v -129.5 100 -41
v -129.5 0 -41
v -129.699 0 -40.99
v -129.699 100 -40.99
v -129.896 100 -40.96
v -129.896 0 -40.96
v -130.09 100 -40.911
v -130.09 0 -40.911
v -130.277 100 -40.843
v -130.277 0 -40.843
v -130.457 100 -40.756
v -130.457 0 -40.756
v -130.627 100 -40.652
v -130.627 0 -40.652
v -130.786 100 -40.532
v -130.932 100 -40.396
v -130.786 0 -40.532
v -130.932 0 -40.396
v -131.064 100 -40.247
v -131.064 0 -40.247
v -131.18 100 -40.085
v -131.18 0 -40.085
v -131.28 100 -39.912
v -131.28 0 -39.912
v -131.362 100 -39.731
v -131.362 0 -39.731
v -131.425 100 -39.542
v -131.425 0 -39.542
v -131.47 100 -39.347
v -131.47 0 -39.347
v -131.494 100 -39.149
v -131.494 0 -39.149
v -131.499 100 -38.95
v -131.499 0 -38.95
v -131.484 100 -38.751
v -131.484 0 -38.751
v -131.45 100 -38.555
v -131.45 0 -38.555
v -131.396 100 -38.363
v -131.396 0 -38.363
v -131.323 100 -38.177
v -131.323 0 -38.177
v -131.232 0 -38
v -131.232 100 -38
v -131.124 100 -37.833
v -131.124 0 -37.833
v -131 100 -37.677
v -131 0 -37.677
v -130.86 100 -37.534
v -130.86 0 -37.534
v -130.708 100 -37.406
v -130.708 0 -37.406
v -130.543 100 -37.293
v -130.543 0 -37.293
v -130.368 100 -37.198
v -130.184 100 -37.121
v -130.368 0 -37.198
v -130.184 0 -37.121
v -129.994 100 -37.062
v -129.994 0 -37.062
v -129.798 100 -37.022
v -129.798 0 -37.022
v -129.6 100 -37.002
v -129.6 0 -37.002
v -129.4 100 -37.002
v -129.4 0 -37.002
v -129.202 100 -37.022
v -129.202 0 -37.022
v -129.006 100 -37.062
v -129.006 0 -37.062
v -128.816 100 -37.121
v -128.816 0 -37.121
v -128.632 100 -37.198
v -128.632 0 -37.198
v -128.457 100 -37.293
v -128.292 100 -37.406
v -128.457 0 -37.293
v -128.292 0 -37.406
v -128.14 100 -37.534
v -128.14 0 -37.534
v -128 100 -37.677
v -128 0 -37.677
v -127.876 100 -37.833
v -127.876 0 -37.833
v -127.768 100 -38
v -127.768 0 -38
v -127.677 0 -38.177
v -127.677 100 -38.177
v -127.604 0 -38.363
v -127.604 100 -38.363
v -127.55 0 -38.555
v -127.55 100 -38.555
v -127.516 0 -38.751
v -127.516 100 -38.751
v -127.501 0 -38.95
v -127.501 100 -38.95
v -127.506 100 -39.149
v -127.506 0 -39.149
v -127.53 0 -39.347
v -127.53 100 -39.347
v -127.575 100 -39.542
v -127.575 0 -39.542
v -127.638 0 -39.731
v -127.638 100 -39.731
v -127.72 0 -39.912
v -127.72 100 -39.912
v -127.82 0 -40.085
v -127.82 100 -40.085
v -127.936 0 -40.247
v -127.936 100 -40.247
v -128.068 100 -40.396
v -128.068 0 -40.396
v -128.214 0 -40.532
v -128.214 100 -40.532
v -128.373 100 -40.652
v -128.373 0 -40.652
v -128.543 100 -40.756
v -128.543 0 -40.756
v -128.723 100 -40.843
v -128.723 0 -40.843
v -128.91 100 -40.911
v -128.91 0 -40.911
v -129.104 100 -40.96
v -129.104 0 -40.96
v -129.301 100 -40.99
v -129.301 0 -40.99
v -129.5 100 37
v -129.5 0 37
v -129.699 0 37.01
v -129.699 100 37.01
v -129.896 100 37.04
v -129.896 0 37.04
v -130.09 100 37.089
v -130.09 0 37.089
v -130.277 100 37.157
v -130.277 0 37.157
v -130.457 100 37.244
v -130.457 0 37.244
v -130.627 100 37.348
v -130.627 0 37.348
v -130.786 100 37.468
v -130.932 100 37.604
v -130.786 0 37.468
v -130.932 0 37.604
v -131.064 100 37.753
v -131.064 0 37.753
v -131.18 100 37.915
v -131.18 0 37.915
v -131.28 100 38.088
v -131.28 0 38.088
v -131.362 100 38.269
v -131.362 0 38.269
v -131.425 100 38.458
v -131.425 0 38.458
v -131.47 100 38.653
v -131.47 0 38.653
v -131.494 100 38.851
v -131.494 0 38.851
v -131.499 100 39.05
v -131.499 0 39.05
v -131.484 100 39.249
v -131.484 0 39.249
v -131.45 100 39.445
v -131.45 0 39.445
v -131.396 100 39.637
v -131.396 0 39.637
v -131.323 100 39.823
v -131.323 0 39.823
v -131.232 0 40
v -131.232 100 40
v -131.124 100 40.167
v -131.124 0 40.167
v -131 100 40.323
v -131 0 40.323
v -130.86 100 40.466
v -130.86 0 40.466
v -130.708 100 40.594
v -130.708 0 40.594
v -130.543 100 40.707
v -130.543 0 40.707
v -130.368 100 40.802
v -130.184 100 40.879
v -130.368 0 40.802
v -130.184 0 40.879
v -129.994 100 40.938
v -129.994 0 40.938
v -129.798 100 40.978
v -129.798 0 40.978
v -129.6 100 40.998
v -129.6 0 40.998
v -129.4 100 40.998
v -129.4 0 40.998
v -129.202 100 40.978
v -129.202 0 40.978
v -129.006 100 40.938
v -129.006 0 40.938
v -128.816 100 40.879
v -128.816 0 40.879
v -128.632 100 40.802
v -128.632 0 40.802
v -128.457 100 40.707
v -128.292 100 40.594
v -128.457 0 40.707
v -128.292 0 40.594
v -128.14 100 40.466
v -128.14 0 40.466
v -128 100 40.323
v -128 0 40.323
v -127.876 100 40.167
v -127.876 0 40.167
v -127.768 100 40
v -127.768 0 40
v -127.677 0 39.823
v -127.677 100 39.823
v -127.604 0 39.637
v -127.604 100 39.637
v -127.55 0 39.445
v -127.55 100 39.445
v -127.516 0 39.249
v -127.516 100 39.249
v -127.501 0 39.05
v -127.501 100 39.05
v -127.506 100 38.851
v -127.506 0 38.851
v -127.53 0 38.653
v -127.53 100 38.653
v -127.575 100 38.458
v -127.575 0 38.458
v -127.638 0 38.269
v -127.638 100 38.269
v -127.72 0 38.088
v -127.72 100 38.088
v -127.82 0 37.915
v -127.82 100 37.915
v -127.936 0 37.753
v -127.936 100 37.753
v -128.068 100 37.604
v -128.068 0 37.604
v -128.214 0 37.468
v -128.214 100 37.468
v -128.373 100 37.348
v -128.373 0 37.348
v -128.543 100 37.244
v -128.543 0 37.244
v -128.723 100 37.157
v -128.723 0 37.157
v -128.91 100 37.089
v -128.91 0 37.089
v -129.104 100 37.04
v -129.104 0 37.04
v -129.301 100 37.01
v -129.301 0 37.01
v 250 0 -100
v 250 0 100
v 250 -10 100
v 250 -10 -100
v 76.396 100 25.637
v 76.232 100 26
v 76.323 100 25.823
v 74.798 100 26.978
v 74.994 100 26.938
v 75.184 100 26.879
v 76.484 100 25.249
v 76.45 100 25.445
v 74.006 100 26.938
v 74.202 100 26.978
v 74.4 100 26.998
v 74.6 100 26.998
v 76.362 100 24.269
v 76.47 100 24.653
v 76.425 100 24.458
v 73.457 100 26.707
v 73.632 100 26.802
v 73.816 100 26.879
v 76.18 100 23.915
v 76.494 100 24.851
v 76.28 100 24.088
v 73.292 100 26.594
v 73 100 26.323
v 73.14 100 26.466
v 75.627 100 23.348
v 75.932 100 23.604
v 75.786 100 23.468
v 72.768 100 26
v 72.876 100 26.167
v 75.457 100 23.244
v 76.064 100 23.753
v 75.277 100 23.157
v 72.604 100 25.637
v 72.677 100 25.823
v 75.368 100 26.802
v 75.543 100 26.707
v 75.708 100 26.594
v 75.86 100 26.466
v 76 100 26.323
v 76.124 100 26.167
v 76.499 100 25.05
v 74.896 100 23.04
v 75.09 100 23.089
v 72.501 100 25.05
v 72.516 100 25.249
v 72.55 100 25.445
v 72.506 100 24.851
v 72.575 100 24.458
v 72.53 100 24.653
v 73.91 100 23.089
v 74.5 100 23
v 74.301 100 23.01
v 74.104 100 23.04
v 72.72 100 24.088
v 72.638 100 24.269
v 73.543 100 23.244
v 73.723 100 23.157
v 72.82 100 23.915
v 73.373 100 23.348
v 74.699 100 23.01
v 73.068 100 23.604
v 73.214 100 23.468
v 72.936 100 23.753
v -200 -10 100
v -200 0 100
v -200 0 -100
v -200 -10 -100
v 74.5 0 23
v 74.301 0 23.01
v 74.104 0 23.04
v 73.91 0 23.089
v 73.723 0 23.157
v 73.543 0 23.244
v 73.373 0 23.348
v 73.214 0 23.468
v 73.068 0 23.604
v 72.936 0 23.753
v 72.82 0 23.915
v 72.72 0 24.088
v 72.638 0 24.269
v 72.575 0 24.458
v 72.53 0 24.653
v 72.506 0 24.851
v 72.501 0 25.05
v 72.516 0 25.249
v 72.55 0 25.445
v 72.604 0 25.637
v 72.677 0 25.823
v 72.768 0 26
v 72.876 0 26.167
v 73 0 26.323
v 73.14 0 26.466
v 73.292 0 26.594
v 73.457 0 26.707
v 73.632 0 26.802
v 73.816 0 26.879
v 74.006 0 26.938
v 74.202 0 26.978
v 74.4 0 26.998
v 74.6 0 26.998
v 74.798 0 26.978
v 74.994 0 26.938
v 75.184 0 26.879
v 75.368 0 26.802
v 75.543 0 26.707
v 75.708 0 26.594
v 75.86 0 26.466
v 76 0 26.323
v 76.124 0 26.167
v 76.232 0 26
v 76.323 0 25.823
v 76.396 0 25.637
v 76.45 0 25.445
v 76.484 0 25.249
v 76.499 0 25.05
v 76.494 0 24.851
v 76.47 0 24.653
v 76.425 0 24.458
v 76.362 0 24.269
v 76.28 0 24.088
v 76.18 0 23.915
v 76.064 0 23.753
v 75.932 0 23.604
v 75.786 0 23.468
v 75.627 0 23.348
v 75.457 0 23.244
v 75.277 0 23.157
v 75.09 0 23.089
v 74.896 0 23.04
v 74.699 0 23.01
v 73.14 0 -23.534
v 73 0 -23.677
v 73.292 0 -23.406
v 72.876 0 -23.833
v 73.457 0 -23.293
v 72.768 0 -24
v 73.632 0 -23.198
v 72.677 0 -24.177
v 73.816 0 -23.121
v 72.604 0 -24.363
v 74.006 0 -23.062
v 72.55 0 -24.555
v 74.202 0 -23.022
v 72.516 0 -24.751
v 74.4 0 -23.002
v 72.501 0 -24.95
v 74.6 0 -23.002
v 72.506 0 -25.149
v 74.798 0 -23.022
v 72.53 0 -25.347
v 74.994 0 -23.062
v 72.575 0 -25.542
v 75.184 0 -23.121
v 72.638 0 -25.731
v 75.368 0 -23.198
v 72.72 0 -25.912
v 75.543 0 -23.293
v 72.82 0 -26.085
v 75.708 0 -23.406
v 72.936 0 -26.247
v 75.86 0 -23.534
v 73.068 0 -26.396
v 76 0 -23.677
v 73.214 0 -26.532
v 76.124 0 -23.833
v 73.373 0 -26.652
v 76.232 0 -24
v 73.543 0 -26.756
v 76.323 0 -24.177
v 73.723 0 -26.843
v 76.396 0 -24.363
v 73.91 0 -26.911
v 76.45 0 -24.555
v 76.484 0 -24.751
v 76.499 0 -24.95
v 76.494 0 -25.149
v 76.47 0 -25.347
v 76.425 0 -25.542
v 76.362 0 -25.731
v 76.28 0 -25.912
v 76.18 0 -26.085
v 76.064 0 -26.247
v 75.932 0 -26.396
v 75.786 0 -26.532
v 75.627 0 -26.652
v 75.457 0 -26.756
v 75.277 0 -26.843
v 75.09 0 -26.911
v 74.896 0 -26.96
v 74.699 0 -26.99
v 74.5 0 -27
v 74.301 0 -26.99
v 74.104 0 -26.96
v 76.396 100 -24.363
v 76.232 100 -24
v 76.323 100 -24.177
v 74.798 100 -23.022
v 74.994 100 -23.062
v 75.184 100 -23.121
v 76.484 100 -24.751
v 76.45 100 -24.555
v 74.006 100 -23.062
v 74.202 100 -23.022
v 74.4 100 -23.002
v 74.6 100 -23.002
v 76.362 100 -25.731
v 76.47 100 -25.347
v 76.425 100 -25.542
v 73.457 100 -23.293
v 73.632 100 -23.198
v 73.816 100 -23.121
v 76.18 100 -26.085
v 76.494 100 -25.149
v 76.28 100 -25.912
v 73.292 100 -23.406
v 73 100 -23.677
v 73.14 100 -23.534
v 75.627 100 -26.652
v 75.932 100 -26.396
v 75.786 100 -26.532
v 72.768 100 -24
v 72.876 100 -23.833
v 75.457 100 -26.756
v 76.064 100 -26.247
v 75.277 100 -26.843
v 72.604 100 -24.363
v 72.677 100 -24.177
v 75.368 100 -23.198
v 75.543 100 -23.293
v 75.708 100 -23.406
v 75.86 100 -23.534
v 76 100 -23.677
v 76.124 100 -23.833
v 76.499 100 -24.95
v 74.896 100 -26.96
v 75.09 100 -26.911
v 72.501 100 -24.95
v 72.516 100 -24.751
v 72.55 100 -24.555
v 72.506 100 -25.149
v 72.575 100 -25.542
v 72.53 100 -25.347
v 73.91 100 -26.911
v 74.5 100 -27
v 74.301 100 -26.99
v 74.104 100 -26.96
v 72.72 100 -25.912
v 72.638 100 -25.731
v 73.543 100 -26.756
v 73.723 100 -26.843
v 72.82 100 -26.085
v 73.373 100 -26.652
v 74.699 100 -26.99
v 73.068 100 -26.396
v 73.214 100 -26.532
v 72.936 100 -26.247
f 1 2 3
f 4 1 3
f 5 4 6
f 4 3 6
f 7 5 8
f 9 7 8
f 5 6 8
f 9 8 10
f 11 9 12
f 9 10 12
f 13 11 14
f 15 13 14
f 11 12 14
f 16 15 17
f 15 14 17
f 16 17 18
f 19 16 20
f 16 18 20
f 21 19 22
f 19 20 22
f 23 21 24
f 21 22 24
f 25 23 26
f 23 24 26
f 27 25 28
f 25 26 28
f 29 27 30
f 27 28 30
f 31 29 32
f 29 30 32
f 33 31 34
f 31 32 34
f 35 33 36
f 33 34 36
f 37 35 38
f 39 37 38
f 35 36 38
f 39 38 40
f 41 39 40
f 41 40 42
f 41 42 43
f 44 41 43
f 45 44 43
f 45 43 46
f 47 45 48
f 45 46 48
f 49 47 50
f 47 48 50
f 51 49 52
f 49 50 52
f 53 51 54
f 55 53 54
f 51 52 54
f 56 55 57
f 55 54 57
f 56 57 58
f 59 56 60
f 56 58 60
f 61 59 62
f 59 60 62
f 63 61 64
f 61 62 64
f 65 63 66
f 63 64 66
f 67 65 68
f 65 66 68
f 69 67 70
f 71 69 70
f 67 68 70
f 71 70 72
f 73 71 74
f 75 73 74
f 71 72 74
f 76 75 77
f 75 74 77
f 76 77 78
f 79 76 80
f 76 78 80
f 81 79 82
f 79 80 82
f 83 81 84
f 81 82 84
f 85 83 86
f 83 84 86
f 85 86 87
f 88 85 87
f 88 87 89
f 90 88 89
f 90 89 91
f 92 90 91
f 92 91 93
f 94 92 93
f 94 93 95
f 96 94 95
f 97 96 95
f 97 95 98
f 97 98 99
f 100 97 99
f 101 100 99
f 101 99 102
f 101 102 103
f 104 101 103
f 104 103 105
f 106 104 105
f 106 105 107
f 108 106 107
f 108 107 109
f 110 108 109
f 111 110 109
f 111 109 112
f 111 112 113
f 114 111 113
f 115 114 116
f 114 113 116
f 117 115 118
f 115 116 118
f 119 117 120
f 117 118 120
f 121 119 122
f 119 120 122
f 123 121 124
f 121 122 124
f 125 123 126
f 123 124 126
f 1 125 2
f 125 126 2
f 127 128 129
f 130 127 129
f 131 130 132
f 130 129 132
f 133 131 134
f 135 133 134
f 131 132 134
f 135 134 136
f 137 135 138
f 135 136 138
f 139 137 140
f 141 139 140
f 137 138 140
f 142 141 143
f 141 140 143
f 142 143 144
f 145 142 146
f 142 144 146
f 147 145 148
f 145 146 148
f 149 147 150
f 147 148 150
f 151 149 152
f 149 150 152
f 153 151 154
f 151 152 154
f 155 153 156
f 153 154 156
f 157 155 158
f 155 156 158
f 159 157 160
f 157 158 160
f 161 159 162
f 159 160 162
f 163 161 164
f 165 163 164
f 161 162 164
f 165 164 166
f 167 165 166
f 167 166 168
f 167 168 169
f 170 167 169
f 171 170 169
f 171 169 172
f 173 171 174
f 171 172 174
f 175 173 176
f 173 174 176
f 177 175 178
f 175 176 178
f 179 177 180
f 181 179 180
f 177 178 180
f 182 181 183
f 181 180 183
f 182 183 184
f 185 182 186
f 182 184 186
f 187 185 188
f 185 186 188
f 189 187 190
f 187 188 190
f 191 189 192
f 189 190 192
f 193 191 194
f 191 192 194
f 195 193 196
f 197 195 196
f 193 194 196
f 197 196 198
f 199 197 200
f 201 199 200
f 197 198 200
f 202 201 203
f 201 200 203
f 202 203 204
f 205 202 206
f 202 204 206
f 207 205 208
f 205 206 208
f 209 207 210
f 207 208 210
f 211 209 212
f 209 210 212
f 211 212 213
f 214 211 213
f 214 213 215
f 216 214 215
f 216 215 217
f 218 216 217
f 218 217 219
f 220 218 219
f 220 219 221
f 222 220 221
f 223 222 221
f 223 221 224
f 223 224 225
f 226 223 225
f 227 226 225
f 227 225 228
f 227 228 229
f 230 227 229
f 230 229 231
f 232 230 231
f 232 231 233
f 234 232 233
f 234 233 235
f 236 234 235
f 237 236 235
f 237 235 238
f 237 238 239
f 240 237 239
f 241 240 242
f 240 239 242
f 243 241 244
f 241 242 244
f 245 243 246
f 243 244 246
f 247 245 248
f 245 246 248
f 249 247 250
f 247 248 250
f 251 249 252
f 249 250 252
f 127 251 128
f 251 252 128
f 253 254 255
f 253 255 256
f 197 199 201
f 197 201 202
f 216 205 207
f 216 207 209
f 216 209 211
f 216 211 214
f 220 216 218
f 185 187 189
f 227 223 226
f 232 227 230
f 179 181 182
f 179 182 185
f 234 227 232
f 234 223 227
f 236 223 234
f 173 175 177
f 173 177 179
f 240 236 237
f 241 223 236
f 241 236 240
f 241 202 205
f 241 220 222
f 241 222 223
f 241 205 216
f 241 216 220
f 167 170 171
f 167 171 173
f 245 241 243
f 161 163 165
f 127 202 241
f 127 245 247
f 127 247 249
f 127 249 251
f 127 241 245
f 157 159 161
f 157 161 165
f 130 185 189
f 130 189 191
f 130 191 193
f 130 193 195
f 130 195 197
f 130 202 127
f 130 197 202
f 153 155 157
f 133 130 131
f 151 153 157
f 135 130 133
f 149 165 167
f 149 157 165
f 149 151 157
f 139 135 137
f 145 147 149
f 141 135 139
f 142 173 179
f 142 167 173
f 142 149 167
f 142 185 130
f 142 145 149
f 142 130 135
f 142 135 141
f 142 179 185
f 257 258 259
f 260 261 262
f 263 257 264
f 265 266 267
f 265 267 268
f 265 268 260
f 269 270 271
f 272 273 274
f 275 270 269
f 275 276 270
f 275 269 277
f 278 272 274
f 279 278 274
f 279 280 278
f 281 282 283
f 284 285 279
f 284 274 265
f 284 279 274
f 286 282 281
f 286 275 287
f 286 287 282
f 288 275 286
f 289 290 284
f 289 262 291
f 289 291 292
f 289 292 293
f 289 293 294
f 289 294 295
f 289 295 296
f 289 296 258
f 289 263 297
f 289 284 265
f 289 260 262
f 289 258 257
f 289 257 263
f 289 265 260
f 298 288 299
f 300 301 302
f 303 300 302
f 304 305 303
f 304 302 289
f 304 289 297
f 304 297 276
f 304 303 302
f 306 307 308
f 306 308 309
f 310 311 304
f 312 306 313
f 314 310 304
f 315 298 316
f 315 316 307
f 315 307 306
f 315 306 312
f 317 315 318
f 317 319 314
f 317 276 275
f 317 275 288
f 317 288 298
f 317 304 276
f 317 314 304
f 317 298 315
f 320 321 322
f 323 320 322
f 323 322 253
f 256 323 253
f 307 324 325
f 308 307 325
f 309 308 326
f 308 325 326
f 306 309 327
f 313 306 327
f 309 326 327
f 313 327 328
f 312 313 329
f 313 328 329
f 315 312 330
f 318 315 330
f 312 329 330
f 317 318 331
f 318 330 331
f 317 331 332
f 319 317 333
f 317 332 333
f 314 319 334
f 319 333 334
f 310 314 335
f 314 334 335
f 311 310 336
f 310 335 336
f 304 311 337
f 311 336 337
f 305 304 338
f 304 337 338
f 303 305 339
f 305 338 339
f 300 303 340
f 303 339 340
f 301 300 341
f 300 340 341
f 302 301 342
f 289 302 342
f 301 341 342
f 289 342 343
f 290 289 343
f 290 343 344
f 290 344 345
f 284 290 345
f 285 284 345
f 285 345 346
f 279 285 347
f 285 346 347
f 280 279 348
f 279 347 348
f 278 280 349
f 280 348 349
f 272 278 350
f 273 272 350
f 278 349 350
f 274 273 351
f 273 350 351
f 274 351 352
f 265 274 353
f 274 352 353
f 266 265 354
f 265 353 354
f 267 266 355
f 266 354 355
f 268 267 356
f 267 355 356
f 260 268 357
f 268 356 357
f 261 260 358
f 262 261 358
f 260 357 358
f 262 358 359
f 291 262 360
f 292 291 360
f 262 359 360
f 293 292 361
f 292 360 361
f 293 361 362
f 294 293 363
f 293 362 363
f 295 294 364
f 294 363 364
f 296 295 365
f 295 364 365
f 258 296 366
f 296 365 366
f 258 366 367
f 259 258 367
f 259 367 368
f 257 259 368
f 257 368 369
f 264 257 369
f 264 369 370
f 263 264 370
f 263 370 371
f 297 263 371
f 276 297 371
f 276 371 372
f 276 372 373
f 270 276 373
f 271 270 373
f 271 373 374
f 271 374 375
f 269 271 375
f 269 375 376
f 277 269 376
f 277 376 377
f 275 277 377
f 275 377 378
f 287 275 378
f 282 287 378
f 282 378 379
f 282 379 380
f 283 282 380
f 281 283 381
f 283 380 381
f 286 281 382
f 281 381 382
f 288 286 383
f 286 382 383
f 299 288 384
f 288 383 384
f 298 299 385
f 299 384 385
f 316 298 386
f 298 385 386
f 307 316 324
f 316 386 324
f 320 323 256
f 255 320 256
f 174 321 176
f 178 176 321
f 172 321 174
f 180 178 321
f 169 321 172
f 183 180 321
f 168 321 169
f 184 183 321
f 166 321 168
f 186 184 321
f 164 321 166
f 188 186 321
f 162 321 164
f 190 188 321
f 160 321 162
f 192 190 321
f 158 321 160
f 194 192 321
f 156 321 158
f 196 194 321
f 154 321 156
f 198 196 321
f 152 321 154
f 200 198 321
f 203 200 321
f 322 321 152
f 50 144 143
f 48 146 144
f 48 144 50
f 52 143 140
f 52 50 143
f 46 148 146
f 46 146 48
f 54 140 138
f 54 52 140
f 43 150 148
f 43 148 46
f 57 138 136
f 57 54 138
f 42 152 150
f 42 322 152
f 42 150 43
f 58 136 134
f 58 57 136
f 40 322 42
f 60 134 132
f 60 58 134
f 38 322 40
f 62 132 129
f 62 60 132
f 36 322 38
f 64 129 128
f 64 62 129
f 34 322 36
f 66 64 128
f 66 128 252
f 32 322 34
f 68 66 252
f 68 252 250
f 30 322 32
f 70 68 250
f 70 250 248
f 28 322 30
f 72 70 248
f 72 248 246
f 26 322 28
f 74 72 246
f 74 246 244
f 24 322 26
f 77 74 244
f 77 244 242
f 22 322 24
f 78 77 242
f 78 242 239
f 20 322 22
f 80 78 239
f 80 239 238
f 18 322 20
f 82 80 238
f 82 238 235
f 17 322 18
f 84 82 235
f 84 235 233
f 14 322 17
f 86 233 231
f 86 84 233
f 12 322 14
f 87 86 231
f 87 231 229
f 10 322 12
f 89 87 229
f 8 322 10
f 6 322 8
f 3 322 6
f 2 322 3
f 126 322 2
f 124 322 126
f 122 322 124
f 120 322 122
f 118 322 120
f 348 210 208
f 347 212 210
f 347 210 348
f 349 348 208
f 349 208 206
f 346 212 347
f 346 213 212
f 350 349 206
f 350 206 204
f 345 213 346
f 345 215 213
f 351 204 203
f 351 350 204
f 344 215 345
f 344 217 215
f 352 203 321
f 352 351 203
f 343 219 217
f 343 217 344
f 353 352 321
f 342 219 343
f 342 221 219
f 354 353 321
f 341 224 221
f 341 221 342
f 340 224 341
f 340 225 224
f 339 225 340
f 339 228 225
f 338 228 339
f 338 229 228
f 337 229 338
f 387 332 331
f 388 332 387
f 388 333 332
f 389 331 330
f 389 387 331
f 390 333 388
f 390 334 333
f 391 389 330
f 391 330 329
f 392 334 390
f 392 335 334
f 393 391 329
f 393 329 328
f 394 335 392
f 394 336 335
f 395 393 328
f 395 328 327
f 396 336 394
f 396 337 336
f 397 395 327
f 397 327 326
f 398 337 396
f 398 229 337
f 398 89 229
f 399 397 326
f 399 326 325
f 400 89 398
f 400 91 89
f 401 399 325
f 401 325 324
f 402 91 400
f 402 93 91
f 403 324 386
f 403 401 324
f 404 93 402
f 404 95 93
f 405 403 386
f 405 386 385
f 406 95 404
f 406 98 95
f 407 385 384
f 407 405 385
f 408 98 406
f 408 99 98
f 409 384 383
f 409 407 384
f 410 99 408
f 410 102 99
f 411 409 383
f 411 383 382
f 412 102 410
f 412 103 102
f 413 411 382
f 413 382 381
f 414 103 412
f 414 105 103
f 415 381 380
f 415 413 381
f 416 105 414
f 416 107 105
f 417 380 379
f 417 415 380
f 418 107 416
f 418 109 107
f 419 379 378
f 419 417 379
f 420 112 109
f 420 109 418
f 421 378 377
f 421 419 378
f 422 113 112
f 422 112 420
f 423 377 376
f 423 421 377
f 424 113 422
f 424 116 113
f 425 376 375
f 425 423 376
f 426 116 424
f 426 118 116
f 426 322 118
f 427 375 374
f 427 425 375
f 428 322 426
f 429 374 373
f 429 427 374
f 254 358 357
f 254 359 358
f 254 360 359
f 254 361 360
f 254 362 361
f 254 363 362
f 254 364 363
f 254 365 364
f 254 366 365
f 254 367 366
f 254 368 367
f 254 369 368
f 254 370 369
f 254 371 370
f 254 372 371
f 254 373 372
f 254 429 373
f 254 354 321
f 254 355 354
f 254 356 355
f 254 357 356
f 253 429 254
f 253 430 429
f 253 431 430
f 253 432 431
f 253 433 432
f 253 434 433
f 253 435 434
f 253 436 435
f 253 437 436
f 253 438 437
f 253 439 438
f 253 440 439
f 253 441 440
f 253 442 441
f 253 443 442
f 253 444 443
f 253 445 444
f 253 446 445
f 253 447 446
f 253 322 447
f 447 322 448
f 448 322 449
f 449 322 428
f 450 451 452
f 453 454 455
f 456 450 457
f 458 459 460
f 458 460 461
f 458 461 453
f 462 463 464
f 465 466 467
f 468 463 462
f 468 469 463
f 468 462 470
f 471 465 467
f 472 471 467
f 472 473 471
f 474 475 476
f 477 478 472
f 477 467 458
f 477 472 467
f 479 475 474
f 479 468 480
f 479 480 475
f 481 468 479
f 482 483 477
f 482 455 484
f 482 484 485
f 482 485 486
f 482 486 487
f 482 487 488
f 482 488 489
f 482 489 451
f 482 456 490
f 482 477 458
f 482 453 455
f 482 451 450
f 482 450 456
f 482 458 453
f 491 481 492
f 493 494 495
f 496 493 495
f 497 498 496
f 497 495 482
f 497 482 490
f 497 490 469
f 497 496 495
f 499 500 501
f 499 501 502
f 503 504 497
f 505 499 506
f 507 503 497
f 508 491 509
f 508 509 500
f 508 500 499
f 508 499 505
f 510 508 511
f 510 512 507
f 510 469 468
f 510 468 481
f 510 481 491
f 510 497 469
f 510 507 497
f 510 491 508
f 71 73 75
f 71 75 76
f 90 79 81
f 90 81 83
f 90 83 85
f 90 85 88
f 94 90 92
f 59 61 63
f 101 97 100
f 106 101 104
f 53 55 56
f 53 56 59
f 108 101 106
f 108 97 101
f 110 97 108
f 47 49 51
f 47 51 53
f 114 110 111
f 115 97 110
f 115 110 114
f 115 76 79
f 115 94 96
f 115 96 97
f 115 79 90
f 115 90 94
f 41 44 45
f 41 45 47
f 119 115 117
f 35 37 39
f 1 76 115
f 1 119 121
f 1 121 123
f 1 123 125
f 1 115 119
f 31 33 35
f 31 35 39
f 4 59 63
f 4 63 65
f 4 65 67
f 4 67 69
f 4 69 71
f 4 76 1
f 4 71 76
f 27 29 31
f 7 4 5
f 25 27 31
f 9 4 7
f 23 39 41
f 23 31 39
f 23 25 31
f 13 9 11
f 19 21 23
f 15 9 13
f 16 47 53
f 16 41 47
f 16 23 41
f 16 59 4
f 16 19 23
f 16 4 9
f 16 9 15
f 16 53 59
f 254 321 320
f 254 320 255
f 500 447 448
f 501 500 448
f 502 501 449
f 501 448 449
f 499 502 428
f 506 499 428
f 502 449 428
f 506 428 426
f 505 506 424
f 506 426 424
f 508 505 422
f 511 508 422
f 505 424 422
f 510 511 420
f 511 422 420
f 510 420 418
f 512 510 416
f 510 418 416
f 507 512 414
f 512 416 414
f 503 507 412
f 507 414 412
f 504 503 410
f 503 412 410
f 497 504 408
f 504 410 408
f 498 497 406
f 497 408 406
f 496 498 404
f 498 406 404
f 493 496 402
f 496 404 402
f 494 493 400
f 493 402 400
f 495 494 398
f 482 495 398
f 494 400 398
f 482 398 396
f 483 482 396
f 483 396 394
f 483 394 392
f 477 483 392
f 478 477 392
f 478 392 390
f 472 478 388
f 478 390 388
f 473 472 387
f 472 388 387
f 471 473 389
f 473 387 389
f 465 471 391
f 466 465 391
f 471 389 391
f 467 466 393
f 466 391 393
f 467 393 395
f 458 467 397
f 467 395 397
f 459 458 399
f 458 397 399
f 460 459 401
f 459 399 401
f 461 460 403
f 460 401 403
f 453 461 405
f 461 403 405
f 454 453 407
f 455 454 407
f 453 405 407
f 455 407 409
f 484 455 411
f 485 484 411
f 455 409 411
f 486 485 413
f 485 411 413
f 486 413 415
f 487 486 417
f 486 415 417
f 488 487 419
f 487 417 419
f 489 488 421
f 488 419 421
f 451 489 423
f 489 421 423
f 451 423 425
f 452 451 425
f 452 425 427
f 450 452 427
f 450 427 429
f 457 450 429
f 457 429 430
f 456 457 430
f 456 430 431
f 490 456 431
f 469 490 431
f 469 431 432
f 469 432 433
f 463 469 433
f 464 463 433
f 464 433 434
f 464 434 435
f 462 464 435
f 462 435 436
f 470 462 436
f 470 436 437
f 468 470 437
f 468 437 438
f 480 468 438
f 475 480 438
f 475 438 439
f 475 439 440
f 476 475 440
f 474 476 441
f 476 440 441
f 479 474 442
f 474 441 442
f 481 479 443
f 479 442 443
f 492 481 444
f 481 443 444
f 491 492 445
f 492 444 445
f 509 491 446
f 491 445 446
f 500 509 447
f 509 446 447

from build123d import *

# Parameters (mm, degrees)
SKETCH_1_W          = 600
SKETCH_1_H          = 200
EXTRUDE_1_DEPTH     = 10
SKETCH_2_R          = 2
EXTRUDE_2_DEPTH     = 100
SKETCH_3_W          = 100
SKETCH_3_H          = 200
SKETCH_3_W_2        = 50
CUT_EXTRUDE_1_DEPTH = 10


with BuildPart() as part:
    # 草图1 → 凸台-拉伸1 (new body)
    with BuildSketch(Plane(origin=(0, 0, 0), x_dir=(1, 0, 0), z_dir=(0, 1, 0))):
        Rectangle(SKETCH_1_W, SKETCH_1_H)
    extrude(amount=-EXTRUDE_1_DEPTH)

    # 草图2 → 凸台-拉伸2 (add)
    with BuildSketch(Plane(origin=(0, 0, 0), x_dir=(1, 0, 0), z_dir=(0, 1, 0))):
        with Locations(Location((-129.5, 39, 0), (0, 0, 90))):
            Circle(SKETCH_2_R)
        with Locations(Location((-129.5, -39, 0), (0, 0, 90))):
            Circle(SKETCH_2_R)
        with Locations(Location((74.5, 25, 0), (0, 0, 90))):
            Circle(SKETCH_2_R)
        with Locations(Location((74.5, -25, 0), (0, 0, 90))):
            Circle(SKETCH_2_R)
    extrude(amount=EXTRUDE_2_DEPTH)

    # 草图3 → 切除-拉伸1 (cut)
    with BuildSketch(Plane(origin=(0, 0, 0), x_dir=(1, 0, 0), z_dir=(0, 1, 0))):
        with Locations((-250, 0)):
            Rectangle(SKETCH_3_W, SKETCH_3_H)
        with Locations((275, 0)):
            Rectangle(SKETCH_3_W_2, SKETCH_3_H)
    extrude(amount=-CUT_EXTRUDE_1_DEPTH, mode=Mode.SUBTRACT)


solid = part.part
